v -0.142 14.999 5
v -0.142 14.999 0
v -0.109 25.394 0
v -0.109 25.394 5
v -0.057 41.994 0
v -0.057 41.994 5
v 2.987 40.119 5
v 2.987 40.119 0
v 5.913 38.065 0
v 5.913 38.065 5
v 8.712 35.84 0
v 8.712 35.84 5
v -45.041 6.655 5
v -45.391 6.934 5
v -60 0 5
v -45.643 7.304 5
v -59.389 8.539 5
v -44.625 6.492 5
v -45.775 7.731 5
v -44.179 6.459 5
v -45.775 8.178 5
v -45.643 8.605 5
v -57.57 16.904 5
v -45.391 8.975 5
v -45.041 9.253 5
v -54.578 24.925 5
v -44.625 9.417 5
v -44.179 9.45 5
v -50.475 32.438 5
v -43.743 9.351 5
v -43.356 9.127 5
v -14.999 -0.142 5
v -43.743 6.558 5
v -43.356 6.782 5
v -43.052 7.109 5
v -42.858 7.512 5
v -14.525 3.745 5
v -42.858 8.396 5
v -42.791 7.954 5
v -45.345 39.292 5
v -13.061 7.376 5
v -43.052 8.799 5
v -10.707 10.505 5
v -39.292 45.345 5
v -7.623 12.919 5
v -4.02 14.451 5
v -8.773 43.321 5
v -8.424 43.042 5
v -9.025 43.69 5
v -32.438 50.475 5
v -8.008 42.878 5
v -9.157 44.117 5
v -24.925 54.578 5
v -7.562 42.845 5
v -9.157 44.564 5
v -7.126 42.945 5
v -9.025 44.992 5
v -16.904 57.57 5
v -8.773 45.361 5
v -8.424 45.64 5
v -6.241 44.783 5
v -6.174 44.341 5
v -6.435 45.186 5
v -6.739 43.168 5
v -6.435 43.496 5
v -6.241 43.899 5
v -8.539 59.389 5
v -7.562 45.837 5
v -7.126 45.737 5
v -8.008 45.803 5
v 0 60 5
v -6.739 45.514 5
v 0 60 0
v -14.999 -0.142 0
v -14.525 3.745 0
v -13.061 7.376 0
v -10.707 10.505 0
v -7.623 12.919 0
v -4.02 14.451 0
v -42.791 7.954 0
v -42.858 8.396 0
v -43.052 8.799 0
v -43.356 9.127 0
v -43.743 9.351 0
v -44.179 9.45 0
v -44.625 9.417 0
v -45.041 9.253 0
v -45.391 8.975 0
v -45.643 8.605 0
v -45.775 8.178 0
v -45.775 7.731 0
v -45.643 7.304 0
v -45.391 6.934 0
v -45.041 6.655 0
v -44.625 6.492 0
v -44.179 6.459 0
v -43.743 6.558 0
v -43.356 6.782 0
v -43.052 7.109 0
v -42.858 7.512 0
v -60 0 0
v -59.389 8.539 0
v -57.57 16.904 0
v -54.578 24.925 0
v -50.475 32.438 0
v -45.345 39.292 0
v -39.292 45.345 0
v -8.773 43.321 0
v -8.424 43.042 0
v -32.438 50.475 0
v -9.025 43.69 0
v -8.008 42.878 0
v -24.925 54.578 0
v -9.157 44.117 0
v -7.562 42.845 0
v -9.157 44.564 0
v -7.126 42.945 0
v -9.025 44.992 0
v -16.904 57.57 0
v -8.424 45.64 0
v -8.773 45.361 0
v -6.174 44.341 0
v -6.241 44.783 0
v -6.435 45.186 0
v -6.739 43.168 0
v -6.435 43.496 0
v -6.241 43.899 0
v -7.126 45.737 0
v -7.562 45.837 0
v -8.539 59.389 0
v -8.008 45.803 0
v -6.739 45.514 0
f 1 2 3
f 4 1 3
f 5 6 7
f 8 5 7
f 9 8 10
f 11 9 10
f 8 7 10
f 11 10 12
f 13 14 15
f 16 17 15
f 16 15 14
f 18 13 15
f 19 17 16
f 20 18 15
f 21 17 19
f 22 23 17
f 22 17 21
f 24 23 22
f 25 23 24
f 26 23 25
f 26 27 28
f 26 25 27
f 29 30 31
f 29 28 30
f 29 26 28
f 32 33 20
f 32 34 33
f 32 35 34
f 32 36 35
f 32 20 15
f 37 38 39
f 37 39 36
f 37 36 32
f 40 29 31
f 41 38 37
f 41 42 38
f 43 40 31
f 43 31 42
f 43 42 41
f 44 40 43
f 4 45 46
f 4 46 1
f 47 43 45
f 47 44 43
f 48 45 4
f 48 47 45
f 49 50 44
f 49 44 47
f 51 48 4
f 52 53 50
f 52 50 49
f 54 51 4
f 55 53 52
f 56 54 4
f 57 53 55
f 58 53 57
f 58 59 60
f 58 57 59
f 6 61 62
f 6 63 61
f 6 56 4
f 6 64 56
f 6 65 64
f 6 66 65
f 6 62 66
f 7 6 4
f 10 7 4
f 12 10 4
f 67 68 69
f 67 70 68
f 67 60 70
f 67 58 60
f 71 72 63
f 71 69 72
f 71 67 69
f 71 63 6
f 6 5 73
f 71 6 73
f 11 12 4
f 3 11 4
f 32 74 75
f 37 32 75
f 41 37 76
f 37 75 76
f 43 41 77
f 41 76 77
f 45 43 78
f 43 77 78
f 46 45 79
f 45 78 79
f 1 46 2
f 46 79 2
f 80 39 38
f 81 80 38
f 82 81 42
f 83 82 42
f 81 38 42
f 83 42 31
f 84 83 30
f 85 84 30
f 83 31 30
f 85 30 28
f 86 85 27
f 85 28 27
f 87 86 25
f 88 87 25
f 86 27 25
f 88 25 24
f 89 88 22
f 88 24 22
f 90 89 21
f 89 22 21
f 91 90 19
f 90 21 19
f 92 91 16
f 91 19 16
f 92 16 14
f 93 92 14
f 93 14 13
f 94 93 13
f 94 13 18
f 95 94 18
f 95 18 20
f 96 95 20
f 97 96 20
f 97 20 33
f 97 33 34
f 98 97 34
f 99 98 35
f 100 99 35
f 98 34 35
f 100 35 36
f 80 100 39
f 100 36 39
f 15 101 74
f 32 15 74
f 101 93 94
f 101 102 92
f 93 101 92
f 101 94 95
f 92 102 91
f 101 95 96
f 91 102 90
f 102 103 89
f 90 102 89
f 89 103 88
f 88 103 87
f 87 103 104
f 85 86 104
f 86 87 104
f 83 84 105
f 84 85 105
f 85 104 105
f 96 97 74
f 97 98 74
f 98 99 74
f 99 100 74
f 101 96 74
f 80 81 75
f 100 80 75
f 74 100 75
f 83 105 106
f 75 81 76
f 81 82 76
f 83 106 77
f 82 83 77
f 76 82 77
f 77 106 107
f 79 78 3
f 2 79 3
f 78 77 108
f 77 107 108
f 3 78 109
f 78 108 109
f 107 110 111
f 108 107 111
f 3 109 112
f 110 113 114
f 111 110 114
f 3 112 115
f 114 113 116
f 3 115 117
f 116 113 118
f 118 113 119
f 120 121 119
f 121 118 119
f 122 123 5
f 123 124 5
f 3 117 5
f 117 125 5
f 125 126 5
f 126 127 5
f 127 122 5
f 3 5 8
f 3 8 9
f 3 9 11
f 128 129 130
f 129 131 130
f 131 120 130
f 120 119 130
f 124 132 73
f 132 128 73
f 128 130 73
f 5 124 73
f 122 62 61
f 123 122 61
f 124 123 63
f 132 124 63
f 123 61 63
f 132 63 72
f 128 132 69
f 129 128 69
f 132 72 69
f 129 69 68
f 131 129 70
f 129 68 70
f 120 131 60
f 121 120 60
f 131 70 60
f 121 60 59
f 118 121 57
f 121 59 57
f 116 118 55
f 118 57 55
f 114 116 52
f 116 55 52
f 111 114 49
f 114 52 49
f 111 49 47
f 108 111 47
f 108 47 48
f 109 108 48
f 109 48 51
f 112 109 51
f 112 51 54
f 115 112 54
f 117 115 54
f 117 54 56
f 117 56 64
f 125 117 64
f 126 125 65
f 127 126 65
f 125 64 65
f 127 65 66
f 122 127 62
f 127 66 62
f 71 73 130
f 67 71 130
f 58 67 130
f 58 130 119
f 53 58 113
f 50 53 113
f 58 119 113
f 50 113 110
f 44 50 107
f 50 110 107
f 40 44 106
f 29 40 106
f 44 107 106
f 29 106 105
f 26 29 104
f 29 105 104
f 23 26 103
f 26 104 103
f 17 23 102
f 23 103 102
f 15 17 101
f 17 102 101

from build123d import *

# Parameters (mm, degrees)
BOSS_EXTRUDE1_DEPTH = 5
SKETCH3_R           = 1.5
CUT_EXTRUDE1_DEPTH  = 5
BOSS_EXTRUDE2_DEPTH = 5


with BuildPart() as part:
    # Sketch2 → Boss-Extrude1 (new body)
    with BuildSketch(Plane.XY):
        with BuildLine():
            Line((-60, 0), (-14.999324285, -0.142376231))
            ThreePointArc((-14.999324285, -0.142376231), (-10.706799113, 10.505448717), (-0.142376231, 14.999324285))
            Line((-0.142376231, 14.999324285), (0, 60))
            ThreePointArc((0, 60), (-42.426406871, 42.426406871), (-60, 0))
        make_face()
    extrude(amount=BOSS_EXTRUDE1_DEPTH)

    # Sketch3 → Cut-Extrude1 (cut)
    with BuildSketch(Plane.XY.offset(5)):
        with Locations((-7.673918476, 44.34084996)):
            Circle(SKETCH3_R)
        with Locations((-44.291404204, 7.954339294)):
            Circle(SKETCH3_R)
    extrude(amount=-CUT_EXTRUDE1_DEPTH, mode=Mode.SUBTRACT)

    # Sketch4 → Boss-Extrude2 (add)
    with BuildSketch(Plane.XY.offset(5)):
        with BuildLine():
            Line((8.712482668, 35.840415418), (-0.109488527, 25.394099488))
            Line((-0.109488527, 25.394099488), (-0.056967441, 41.994372784))
            ThreePointArc((-0.056967441, 41.994372784), (4.465384672, 39.11351402), (8.712482668, 35.840415418))
        make_face()
    extrude(amount=-BOSS_EXTRUDE2_DEPTH)


solid = part.part
